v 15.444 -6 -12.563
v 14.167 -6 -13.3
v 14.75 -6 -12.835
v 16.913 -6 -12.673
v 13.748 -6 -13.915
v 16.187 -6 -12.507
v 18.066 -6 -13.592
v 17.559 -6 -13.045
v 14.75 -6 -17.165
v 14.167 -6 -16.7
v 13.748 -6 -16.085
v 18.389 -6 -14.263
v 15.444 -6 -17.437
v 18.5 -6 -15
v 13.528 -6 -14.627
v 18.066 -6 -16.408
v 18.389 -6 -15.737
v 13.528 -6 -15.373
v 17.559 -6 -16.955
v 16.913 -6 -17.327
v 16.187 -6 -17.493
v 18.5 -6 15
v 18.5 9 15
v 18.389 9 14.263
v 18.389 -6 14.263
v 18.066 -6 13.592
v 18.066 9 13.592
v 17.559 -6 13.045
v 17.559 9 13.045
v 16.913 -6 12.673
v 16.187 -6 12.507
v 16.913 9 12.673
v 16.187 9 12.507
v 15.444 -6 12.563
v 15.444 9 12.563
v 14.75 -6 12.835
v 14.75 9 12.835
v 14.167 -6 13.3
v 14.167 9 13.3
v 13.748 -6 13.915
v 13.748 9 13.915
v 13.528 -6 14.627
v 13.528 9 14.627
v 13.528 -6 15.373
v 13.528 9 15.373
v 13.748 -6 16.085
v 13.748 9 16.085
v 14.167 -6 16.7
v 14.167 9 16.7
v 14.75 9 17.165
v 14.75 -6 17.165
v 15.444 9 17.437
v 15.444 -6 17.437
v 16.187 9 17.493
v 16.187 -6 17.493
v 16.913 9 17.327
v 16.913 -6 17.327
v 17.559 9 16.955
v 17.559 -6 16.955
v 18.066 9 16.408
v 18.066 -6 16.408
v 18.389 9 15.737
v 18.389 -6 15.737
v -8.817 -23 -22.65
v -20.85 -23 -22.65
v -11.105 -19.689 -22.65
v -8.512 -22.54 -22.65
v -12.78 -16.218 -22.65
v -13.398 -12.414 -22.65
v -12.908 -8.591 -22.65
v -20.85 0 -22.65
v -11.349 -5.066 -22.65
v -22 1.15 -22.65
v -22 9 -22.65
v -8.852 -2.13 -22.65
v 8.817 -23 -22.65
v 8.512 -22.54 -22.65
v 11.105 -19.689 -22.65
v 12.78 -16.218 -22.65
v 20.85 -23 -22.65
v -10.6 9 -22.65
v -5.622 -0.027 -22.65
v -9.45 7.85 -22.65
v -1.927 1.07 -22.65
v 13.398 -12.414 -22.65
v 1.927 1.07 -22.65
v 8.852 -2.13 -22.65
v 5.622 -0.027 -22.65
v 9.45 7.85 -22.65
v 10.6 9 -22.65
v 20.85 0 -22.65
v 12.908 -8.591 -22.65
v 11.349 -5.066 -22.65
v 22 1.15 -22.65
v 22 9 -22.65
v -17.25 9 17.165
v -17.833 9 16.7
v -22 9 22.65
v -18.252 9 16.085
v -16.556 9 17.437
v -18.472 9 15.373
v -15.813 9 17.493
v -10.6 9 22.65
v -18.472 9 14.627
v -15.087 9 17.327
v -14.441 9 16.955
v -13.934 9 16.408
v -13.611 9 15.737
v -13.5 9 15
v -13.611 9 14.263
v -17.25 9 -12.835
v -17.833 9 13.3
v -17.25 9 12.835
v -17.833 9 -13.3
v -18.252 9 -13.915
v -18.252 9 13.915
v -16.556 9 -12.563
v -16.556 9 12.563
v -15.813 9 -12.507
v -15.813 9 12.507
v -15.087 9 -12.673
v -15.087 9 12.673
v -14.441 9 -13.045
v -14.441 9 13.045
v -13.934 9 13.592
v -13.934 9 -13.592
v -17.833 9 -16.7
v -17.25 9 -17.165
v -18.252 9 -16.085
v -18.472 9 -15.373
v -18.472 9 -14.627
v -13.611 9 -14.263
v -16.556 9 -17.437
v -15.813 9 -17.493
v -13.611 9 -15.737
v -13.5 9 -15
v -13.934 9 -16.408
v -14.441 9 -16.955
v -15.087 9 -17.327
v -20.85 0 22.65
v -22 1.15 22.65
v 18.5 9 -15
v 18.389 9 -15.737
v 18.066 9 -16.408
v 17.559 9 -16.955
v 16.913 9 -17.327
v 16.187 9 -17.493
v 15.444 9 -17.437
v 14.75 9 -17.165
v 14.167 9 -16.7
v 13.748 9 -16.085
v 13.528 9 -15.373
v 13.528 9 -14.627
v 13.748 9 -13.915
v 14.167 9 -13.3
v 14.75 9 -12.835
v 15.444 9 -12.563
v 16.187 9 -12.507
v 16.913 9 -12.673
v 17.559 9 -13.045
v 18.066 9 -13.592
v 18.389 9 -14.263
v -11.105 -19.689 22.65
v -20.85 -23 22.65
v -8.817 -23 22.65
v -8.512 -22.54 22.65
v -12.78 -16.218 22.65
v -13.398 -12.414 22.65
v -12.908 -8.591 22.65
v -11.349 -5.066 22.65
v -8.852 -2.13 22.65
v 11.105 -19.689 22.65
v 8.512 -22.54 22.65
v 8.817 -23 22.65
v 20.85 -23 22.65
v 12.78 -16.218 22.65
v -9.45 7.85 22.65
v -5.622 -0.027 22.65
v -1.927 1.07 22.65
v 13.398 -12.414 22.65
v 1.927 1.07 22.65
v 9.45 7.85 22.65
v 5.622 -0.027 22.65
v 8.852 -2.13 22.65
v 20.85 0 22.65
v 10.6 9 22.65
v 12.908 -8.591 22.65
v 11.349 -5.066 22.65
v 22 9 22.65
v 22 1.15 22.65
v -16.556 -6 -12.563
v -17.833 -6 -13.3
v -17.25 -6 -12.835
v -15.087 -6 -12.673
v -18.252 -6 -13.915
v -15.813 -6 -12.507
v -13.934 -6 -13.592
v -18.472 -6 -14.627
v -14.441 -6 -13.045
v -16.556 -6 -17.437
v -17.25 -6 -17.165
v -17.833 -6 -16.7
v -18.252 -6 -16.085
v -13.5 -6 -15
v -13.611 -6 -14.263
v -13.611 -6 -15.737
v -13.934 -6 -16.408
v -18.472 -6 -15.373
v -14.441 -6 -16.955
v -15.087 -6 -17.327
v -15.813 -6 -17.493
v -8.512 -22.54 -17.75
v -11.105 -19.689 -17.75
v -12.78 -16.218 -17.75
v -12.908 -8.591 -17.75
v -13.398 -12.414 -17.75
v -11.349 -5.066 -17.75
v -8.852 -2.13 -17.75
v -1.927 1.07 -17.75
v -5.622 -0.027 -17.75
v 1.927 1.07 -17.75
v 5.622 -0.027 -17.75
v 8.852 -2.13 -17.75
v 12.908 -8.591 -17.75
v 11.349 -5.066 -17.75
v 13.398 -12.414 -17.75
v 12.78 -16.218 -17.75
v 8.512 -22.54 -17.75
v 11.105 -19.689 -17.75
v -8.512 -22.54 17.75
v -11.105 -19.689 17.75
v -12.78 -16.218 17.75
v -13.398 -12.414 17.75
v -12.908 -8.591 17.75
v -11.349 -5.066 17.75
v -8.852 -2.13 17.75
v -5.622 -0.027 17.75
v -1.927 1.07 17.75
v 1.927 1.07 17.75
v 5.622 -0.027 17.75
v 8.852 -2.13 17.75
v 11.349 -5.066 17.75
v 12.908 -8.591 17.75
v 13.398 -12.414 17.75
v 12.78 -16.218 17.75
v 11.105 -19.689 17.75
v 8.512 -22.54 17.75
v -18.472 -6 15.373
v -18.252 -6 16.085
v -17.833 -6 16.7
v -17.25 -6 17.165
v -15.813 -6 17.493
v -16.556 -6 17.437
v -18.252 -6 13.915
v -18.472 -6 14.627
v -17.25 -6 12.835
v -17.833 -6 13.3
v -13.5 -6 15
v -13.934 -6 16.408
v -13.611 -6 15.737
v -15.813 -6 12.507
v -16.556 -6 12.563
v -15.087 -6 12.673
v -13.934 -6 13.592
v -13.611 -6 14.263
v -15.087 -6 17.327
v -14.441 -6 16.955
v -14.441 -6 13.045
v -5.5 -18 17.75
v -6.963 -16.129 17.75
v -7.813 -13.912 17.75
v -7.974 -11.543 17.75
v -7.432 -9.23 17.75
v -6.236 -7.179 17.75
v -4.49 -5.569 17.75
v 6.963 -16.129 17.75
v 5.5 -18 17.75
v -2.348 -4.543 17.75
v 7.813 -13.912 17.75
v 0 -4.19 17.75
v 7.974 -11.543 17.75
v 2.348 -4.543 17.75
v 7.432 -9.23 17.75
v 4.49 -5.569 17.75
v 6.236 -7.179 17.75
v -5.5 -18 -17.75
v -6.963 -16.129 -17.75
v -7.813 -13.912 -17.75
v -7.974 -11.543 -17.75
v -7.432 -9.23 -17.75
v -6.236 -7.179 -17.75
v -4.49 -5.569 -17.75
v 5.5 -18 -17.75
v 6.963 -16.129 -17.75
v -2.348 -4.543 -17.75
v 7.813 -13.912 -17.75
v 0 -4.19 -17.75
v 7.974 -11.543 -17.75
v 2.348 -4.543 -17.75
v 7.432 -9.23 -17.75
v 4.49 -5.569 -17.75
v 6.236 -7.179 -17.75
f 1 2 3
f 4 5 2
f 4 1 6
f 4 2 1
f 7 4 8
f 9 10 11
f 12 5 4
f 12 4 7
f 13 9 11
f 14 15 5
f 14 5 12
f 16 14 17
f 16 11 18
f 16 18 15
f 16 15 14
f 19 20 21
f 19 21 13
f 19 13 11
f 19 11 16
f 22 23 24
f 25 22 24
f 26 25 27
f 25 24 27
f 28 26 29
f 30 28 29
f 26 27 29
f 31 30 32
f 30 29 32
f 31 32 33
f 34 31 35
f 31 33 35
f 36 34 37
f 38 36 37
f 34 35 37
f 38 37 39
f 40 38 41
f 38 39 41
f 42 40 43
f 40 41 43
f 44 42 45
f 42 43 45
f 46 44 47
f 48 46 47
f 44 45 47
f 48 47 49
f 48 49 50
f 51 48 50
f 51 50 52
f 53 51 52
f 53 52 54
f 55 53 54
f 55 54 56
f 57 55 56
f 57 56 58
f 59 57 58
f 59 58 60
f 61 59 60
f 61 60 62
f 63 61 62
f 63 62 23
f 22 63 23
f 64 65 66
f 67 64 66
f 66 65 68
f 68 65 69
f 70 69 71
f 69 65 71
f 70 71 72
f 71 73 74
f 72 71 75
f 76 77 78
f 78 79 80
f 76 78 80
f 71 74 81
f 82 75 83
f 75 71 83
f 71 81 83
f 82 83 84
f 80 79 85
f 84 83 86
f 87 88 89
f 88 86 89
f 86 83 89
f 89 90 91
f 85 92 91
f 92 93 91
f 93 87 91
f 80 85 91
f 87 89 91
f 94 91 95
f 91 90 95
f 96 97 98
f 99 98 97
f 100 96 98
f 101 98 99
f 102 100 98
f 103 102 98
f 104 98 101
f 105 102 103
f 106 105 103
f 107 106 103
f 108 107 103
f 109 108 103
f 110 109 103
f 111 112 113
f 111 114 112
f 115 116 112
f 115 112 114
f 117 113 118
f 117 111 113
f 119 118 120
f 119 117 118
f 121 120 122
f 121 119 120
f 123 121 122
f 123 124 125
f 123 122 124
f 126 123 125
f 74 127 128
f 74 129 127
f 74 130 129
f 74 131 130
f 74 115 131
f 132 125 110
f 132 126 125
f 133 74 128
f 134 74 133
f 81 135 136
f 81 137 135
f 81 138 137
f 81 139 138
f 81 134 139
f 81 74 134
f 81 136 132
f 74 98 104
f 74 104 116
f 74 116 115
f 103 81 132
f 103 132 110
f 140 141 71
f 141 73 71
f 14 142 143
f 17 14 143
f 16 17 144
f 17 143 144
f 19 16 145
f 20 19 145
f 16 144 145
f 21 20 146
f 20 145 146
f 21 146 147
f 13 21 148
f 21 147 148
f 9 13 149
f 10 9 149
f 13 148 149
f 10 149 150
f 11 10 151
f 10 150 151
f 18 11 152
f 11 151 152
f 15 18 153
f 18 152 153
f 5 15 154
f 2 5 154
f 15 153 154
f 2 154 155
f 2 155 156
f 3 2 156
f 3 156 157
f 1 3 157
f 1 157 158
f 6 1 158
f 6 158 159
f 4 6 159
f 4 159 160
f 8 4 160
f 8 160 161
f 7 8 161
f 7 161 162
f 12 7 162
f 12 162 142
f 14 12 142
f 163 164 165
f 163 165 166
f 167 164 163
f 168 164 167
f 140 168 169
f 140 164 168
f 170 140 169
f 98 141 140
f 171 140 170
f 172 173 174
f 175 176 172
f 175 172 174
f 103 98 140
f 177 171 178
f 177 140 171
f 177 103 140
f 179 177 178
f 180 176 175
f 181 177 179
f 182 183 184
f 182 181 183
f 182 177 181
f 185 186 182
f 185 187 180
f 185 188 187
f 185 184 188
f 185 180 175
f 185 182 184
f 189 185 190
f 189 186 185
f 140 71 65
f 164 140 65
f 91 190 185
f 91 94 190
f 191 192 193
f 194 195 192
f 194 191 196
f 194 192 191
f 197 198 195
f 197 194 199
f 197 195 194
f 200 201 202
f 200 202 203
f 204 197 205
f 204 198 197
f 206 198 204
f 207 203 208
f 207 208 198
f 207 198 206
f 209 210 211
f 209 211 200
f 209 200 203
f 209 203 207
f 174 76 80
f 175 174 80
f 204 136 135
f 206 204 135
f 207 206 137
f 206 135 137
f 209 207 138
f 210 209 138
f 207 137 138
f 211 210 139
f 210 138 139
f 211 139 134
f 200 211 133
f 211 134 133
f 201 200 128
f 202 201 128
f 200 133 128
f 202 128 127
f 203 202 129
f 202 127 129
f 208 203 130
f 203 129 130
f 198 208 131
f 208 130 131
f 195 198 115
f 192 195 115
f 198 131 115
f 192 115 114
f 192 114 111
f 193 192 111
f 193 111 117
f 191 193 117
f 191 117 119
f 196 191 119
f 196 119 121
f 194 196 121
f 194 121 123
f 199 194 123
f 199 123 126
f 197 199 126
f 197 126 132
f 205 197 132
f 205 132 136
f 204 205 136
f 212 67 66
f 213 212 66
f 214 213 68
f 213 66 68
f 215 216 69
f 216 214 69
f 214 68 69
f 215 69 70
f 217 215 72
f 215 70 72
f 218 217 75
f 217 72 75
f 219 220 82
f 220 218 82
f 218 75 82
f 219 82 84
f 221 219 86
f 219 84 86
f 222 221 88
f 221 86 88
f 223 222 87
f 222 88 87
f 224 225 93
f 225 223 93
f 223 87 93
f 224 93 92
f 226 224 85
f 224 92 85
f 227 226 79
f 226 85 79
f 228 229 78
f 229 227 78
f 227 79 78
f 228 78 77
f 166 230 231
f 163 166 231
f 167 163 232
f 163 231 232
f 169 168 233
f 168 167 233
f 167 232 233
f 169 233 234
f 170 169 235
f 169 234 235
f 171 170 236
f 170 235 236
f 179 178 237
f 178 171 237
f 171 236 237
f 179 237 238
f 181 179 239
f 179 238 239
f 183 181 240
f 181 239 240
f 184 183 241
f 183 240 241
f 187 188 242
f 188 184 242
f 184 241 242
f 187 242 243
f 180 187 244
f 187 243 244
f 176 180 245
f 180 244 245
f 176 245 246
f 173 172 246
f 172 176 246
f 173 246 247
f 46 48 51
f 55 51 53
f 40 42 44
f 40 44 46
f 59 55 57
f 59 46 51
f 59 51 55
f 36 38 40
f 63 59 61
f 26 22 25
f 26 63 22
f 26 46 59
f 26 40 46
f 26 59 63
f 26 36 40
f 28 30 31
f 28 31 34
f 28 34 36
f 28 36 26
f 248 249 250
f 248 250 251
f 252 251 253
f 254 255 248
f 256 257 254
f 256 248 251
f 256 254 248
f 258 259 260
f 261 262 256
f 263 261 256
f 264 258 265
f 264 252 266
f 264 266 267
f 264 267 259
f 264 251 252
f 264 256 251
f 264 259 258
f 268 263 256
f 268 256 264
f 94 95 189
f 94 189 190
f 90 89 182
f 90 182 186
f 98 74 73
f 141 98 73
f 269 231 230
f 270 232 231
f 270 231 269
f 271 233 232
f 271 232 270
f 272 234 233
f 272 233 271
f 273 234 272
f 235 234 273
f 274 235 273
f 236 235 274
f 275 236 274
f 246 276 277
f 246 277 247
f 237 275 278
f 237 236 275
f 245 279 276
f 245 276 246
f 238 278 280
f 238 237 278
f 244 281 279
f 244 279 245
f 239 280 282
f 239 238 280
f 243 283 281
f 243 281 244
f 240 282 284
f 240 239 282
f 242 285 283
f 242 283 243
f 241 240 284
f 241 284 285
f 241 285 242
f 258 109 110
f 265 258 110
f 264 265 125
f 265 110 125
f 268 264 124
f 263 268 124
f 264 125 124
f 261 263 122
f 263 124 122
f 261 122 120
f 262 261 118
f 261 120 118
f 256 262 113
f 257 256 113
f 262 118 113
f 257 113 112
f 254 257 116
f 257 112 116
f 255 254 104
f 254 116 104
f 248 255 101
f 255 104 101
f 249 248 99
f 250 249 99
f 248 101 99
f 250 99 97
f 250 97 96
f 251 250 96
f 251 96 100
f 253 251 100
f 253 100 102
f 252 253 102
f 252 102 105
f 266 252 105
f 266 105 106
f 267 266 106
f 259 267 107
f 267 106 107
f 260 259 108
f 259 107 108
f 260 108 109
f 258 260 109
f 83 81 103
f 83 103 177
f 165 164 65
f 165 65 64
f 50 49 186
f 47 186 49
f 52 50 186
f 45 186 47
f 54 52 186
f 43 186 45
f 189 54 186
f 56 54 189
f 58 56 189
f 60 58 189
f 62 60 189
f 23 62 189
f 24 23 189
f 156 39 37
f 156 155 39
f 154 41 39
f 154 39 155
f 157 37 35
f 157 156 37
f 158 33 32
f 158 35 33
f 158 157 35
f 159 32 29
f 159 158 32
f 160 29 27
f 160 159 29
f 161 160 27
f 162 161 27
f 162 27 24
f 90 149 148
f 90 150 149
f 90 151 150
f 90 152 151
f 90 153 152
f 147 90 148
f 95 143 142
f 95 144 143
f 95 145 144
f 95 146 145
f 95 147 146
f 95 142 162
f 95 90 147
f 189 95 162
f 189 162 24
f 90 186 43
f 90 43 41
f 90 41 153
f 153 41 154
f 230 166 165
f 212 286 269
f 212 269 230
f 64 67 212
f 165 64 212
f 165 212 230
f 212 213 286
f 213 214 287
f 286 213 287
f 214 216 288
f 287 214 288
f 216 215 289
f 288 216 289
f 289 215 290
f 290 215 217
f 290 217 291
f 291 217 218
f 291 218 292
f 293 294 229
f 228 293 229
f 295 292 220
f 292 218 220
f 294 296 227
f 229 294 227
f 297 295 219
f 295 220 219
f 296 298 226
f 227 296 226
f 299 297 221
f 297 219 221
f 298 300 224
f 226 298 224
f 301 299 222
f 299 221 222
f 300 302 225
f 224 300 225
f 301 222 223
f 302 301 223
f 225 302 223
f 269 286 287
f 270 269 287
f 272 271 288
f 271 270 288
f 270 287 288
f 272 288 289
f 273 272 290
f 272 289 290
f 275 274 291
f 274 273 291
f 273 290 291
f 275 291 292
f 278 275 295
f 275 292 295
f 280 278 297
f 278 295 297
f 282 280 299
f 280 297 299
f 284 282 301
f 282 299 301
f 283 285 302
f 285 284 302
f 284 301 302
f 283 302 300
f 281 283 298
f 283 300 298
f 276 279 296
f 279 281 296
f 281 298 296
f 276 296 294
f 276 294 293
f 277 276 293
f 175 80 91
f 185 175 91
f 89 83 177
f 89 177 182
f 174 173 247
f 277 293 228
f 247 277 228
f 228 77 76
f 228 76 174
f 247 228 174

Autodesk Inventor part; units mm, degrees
ref_plane "YZ Plane" through (0, 0, 0) normal (1, 0, 0) x (0, 1, 0)
ref_plane "XZ Plane" through (0, 0, 0) normal (0, 1, 0) x (-1, 0, 0)
ref_plane "XY Plane" through (0, 0, 0) normal (0, 0, 1) x (1, 0, 0)
sketch "Sketch1" plane through (0, 0, 0) normal (0, 0, 1) x (1, 0, 0)
  line L0 (-20.85, 0) -> (-20.85, -23)
  line L1 (20.85, -23) -> (20.85, 0)
  line L2 (0, 0) -> (0, -23) construction
  line L3 (-22, 9) -> (-22, 1.15)
  line L4 (-22, 1.15) -> (-20.85, 0)
  line L5 (22, 9) -> (22, 1.15)
  line L6 (22, 1.15) -> (20.85, 0)
  line L7 (0, 0) -> (0, 7.85) construction
  line L8 (-10.6, 9) -> (-9.45, 7.85)
  line L9 (-9.45, 7.85) -> (0, 7.85)
  line L10 (0, 7.85) -> (9.45, 7.85)
  line L11 (9.45, 7.85) -> (10.6, 9)
  line L12 (-22, 9) -> (-10.6, 9)
  line L13 (10.6, 9) -> (22, 9)
  arc A0 (5.5, -18) -> (-5.5, -18) centre (0, -12.1905) ccw
  line L14 (-5.5, -18) -> (5.5, -18) construction
  line L15 (-5.5, -18) -> (-8.8166, -23)
  line L16 (5.5, -18) -> (8.8166, -23)
  line L17 (-20.85, -23) -> (-8.8166, -23)
  line L18 (8.8166, -23) -> (20.85, -23)
  line L19 (8.8166, -23) -> (-8.8166, -23) construction
  arc A1 (8.5116, -22.5401) -> (-8.5116, -22.5401) centre (0, -12.1905) ccw
  point P0 (20.85, -11.5)
  dimension "d1" = 44
  dimension "d3" = 135
  dimension "d4" = 135
  dimension "d5" = 18.9
  dimension "d8" = 23
  dimension "d9" = 135
  dimension "d10" = 23
  dimension "d11" = 1.15
  dimension "d12" = 1.15
  dimension "d13" = 16
  dimension "d14" = 11
  dimension "d16" = 6
  dimension "d17" = 5
  dimension "d18" = 32
  dimension "d19" = 5.4
extrude "Extrusion1" add sketch "Sketch1" along normal mid plane 45.3 contours L4 L3 L12 L8 L9 L10 L11 L13 L5 L6 L1 L18 L16 A1 L15 L17 L0
extrude "Extrusion2" add sketch "Sketch1" along normal mid plane 35.5 contours A1 L16 A0 L15
sketch "Sketch2" plane through (-22, 9, 22.65) normal (0, 1, 0) x (1, 0, 0)
  line L0 (0, 45.3) -> (11.4, 45.3) projected
  line L1 (0, 45.3) -> (0, 0) projected
  line L2 (32.6, 45.3) -> (44, 45.3) projected
  line L3 (44, 45.3) -> (44, 0) projected
  circle A0 centre (38, 37.65) radius 2.5
  circle A1 centre (38, 7.65) radius 2.5
  line L4 (38, 37.65) -> (38, 7.65) construction
  line L5 (38, 22.65) -> (44, 22.65) construction
  circle A2 centre (6, 37.65) radius 2.5
  circle A3 centre (6, 7.65) radius 2.5
  line L6 (6, 37.65) -> (6, 7.65) construction
  line L7 (6, 22.65) -> (0, 22.65) construction
  point P0 (22, 22.65)
  dimension "d24" = 5
  dimension "d25" = 5
  dimension "d26" = 30
  dimension "d27" = 5
  dimension "d28" = 5
  dimension "d29" = 30
  dimension "d30" = 32
extrude "Extrusion3" cut sketch "Sketch2" against normal blind 15
equation "\"d10\" = d8"
equation "\"d25\" = d24"
equation "\"d28\" = d27"
properties part number "Linear Rail Slider Block"
